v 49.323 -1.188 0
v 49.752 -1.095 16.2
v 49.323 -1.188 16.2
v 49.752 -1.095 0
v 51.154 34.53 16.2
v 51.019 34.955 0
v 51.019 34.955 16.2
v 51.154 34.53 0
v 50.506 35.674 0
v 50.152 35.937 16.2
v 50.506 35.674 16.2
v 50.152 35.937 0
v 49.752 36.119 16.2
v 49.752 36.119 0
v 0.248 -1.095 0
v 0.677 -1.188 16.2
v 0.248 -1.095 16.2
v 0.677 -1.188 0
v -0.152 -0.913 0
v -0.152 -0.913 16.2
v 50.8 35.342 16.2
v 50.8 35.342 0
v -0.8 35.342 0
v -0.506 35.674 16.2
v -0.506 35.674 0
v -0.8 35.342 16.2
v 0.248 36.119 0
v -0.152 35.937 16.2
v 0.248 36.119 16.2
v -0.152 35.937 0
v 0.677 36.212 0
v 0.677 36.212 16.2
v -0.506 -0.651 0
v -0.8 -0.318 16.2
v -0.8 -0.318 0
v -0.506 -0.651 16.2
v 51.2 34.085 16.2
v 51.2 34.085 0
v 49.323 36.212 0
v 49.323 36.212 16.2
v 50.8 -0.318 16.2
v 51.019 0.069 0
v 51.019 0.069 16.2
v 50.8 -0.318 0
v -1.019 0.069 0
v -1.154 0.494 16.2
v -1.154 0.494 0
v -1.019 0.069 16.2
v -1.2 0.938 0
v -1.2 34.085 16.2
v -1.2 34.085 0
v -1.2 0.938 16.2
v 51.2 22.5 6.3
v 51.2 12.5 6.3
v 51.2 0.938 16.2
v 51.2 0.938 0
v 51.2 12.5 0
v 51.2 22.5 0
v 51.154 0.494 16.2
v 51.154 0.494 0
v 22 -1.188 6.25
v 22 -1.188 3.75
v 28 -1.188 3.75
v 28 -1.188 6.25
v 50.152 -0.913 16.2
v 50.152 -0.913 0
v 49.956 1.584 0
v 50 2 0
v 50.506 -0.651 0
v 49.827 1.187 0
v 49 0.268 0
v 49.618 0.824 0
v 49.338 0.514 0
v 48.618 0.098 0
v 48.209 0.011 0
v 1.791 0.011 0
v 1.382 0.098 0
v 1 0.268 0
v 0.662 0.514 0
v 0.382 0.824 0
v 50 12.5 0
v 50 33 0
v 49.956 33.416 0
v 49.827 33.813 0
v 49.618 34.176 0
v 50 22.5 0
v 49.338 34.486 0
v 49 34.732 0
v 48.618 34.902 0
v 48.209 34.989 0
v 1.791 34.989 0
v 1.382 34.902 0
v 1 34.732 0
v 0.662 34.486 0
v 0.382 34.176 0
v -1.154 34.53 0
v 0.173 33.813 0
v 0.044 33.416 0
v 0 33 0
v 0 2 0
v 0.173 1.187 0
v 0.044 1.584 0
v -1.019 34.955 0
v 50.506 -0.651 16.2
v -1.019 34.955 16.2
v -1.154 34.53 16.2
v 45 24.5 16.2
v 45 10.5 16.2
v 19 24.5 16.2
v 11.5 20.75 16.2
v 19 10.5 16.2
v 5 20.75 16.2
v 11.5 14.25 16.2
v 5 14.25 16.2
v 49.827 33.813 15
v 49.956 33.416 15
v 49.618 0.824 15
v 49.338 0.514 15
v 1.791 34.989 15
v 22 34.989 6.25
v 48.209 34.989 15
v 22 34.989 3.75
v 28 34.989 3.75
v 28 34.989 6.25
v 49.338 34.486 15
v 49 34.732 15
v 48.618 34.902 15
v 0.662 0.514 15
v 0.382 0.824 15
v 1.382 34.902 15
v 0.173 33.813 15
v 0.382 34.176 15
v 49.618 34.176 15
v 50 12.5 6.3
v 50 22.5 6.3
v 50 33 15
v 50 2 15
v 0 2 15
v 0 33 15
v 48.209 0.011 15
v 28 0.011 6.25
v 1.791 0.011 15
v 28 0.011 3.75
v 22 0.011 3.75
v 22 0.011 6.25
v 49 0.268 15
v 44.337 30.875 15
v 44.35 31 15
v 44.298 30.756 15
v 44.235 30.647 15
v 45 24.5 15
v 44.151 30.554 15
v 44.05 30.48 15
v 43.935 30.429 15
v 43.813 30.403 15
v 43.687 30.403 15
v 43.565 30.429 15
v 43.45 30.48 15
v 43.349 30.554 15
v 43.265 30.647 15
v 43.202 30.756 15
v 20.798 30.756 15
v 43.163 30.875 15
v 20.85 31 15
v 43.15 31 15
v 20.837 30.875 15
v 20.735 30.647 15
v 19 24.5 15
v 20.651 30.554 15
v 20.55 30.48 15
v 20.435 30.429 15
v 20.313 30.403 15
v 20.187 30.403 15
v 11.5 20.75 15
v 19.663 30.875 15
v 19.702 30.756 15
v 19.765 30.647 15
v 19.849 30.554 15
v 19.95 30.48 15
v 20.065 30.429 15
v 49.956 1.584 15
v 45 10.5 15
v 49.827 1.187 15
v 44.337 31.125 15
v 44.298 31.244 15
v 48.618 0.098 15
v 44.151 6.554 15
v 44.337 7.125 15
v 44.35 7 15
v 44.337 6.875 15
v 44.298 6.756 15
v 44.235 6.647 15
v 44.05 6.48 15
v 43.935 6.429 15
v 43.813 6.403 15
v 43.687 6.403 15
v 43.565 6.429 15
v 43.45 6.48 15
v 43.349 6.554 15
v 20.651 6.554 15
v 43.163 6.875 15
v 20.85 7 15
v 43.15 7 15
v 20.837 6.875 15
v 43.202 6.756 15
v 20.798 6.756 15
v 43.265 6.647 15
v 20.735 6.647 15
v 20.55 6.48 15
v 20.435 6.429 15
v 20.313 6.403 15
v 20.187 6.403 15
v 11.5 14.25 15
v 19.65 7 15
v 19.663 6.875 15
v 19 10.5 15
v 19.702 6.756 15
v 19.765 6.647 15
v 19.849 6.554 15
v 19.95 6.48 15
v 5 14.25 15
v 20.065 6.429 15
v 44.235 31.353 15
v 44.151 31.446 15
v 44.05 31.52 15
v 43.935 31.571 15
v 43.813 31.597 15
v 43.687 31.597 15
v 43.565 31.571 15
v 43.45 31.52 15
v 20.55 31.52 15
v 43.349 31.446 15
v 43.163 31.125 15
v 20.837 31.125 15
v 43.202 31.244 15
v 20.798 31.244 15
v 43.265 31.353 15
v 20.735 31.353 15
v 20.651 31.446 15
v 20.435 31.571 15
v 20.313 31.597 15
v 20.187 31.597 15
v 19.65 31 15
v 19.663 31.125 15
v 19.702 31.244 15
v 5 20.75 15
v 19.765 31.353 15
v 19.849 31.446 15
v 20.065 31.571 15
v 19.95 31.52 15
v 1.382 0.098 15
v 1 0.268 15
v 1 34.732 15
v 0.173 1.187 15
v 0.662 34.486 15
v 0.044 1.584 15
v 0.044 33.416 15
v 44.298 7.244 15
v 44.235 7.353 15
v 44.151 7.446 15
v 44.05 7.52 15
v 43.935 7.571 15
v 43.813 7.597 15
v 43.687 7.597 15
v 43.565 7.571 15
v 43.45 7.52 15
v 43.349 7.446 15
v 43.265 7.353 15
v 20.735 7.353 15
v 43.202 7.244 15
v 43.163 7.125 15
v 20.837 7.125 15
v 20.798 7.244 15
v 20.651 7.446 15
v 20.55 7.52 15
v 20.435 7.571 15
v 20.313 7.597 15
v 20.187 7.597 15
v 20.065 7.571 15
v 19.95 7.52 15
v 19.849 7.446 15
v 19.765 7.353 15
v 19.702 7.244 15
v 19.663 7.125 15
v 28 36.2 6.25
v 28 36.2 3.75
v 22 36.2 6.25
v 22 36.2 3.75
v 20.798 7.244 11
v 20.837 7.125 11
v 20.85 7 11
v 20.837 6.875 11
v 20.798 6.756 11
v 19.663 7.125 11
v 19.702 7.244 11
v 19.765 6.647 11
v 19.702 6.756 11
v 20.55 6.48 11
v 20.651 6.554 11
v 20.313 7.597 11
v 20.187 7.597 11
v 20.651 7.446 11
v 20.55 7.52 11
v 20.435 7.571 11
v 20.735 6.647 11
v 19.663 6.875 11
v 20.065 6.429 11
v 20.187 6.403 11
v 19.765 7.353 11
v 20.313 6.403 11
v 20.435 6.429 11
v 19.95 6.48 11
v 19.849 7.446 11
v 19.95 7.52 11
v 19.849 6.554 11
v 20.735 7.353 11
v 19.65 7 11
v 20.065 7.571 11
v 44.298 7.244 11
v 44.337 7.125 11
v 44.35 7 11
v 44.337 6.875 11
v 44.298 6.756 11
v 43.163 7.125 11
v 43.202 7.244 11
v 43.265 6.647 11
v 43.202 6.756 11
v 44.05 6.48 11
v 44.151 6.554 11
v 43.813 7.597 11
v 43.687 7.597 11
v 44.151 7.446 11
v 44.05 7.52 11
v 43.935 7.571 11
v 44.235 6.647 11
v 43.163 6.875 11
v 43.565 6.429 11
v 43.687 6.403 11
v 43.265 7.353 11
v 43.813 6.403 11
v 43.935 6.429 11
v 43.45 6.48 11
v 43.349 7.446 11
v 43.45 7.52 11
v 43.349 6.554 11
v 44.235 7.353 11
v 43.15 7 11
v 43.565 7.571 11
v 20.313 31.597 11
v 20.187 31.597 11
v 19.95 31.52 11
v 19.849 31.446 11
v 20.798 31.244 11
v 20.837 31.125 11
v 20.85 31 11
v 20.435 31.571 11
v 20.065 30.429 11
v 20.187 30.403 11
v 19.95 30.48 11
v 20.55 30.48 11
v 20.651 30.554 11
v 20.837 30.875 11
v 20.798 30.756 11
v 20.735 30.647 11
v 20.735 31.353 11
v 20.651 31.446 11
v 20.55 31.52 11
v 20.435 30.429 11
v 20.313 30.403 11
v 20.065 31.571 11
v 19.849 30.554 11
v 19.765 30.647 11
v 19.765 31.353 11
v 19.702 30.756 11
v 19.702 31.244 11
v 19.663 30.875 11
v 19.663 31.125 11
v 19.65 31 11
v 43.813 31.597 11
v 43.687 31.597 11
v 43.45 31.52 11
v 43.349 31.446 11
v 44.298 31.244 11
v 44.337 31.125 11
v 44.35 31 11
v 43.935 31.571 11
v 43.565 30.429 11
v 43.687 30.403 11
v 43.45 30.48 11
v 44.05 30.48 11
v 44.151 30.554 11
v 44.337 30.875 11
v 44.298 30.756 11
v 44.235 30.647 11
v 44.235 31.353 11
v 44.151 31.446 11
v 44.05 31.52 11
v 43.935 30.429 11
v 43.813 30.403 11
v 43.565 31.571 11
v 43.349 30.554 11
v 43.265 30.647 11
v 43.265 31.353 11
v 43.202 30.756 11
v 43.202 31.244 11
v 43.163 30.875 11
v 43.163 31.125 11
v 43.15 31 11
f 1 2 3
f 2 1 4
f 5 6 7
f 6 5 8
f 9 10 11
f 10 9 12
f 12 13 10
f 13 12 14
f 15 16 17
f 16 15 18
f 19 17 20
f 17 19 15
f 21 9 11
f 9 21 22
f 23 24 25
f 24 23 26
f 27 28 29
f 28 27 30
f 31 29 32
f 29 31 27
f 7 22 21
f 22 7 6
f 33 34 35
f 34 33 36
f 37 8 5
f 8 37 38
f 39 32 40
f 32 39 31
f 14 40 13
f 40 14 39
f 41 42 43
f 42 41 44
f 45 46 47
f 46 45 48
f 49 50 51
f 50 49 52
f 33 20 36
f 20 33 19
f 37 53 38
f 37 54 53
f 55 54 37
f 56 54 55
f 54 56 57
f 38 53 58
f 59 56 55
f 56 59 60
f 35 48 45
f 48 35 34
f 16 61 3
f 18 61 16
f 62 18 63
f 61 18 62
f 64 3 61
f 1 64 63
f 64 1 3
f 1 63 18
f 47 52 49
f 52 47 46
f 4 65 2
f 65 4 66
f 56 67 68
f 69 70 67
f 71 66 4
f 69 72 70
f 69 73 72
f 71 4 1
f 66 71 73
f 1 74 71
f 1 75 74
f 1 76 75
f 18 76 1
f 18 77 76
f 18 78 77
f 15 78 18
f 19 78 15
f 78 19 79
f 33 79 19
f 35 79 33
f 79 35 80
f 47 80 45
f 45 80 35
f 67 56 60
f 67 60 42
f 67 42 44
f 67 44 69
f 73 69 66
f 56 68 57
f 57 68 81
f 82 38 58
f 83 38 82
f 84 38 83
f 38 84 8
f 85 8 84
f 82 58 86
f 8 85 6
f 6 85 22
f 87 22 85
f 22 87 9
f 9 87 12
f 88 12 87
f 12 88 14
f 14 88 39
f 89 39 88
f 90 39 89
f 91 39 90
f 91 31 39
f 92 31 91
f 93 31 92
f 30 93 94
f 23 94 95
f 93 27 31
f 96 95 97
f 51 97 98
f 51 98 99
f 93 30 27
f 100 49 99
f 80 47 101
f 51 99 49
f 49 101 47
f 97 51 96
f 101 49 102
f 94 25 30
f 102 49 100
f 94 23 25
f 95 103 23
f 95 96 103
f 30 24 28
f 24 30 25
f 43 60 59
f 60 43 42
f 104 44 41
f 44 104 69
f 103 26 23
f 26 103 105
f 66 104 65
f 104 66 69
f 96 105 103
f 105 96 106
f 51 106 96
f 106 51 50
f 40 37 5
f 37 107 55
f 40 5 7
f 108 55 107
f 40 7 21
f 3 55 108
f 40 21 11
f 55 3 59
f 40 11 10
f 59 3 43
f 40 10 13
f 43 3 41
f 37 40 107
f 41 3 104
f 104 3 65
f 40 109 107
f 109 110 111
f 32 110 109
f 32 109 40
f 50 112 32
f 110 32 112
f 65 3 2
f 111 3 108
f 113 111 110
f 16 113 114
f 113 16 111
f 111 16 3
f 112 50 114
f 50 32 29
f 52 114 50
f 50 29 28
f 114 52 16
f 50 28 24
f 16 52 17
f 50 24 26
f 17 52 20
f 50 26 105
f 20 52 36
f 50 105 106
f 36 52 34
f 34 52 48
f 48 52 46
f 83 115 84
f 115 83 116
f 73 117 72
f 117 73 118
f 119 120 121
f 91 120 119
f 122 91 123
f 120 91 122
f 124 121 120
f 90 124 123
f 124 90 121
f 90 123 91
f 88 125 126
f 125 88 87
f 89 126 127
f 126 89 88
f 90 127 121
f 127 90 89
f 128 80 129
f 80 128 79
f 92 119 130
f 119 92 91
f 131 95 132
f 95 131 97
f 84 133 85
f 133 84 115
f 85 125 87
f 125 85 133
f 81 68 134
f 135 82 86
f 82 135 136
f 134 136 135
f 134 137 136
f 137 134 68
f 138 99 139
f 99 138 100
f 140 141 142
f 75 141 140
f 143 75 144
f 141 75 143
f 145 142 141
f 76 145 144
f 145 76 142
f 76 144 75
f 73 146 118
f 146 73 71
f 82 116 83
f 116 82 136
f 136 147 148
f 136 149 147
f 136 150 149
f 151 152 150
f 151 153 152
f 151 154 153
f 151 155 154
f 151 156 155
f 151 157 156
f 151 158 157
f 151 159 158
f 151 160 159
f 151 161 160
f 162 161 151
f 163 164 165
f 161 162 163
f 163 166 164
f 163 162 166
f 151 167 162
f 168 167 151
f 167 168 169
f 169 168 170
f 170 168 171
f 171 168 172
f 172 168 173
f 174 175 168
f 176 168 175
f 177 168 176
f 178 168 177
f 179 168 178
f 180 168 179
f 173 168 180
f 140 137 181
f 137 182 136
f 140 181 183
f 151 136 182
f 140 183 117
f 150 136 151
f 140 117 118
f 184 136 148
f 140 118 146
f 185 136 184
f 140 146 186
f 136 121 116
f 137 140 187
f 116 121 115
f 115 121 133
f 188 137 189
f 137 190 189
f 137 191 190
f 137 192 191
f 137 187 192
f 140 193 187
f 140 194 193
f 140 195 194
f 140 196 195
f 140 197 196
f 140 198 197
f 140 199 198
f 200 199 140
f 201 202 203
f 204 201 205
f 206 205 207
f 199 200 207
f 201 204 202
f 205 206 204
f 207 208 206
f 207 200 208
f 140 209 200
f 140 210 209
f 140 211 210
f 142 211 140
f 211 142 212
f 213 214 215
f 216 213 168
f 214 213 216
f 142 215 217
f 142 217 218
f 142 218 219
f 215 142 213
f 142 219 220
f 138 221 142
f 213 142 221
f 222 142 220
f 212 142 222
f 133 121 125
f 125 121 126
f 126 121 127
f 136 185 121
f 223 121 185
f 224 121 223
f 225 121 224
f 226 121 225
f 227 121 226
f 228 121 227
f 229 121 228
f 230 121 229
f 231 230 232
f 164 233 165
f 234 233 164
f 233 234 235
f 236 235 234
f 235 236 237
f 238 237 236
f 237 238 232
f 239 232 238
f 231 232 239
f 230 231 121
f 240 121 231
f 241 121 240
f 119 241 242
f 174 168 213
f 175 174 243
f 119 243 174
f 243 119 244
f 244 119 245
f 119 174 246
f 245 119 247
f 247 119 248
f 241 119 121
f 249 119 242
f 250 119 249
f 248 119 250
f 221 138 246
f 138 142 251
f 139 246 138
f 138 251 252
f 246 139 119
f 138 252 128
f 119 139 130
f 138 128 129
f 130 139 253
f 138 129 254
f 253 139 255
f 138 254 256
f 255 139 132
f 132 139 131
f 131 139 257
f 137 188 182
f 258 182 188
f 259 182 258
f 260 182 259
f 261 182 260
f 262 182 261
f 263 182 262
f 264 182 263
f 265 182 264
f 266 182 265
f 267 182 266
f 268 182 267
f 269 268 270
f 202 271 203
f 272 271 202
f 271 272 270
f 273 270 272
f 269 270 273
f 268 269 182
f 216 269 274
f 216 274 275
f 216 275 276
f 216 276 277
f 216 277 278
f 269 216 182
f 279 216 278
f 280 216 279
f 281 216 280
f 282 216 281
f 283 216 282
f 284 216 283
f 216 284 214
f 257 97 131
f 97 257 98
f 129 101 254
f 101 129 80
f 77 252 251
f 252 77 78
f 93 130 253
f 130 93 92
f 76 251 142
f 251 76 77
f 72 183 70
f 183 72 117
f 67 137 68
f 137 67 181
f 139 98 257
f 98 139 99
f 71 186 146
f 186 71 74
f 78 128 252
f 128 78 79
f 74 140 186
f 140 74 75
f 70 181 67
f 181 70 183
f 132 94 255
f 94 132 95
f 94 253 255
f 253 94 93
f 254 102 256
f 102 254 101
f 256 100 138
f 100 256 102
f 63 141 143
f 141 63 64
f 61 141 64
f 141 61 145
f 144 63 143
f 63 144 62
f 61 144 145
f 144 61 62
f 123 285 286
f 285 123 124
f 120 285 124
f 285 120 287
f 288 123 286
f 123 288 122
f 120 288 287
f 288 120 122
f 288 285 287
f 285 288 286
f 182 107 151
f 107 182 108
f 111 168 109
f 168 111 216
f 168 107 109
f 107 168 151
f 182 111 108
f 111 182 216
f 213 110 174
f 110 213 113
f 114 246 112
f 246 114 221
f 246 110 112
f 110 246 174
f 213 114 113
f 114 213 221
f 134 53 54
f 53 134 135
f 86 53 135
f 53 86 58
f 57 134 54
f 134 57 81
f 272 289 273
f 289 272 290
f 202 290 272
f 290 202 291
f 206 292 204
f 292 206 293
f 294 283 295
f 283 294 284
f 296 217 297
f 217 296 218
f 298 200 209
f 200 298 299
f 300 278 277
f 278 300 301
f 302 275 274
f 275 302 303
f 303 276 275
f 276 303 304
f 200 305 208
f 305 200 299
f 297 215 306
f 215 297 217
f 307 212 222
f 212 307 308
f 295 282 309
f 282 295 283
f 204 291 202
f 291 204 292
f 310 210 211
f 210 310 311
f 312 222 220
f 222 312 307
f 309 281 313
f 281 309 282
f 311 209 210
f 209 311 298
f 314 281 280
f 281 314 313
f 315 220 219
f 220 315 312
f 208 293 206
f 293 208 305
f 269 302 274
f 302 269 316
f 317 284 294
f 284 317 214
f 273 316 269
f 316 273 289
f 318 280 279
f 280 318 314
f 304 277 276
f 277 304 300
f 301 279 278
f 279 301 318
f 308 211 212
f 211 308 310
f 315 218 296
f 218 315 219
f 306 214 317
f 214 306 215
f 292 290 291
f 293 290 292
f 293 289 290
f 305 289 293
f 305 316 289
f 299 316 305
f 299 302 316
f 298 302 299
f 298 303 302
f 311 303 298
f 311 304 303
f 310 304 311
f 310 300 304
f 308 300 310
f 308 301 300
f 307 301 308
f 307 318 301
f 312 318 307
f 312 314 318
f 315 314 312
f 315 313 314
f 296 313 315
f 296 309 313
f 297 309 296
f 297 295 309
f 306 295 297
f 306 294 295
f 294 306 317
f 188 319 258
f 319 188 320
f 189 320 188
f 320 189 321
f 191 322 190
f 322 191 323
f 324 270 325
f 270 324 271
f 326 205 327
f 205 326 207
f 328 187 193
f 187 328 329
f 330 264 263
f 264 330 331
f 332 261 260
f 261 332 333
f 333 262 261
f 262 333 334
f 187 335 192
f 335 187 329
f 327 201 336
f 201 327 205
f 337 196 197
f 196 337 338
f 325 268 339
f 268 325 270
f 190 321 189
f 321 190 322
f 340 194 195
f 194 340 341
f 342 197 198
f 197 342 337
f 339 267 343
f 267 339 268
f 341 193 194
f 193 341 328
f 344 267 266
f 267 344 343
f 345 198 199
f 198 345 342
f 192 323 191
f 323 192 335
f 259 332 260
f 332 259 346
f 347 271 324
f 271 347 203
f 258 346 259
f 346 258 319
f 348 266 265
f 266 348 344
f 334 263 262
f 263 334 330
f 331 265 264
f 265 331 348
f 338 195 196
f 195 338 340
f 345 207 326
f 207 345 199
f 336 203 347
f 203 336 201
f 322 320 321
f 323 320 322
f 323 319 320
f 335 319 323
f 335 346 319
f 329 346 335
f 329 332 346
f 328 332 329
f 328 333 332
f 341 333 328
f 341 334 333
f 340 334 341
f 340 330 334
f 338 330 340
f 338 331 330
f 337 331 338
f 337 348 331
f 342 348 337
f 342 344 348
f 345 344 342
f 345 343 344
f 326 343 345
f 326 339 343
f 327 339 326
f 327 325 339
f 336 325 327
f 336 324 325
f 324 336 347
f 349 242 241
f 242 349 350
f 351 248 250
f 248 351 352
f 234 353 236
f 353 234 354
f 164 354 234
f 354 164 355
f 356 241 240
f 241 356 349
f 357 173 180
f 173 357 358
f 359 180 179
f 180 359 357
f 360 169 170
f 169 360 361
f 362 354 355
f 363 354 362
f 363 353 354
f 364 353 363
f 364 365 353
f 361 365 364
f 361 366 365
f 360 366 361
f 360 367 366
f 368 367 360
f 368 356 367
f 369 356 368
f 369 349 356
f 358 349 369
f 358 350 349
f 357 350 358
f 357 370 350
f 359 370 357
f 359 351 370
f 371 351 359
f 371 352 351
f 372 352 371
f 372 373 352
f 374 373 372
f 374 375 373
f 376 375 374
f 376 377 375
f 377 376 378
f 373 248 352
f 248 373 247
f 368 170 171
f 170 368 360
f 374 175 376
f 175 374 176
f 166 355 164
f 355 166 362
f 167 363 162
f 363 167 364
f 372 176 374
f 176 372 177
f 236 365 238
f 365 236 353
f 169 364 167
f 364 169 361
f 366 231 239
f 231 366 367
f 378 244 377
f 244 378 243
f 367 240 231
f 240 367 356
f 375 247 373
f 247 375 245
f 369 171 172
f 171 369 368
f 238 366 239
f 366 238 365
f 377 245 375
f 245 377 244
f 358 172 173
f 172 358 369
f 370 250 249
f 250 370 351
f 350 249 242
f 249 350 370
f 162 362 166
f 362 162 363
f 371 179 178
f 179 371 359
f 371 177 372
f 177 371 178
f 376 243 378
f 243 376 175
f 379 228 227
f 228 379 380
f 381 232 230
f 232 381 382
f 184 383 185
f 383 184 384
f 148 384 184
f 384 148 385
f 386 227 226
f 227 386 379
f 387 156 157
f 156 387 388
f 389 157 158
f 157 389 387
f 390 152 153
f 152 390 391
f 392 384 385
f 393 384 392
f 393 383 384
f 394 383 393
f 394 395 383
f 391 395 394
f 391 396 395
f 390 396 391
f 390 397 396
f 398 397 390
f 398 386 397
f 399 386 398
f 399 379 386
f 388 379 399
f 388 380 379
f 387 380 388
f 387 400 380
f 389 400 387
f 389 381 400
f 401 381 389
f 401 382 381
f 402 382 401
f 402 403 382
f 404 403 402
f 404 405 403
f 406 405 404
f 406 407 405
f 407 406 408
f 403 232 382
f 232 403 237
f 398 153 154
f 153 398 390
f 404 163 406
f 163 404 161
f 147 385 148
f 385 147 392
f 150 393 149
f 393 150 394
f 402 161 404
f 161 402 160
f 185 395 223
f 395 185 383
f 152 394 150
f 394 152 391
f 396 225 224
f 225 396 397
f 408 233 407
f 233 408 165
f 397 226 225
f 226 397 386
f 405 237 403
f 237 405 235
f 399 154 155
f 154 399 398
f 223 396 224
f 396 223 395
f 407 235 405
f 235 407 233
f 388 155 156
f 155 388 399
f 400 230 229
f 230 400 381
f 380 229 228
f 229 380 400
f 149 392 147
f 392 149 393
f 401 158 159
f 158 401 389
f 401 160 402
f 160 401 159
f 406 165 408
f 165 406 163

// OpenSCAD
shell_t = 1.2;
inner_w = 50;
inner_h = 35;
inner_l = 15;
corner_r = 2;

lcd_opening_w = 26;
lcd_opening_h = 14;
lcd_up_offset = 6.5;
lcd_opening_x_margin = 5;

lcd_pegs_span_x = 23.5;
lcd_pegs_span_y = 24;
lcd_pegs_d = 1.2;
lcd_pegs_h = 4 + shell_t;
lcd_pegs_y_shift = 1.5;

button_d = 6.5;
button_x_margin = 5;

snap_slit_width = 6;
snap_slit_height = 2.5;
snap_slit_z = 5;

usb_slit_w = 10;
usb_slit_h = 8;
usb_slit_depth = 8;

cage_inner_wx = 35;
cage_inner_wy = 26.5;
cage_h = 7.5;
cage_t = 1.2;
cage_claw_wy = 10;
cage_claw_wx = 15;
cage_claw_t = 2;

tolerance = 0.5;

$fs = 0.01;

module box(width, height, length) {
     translate([inner_w / 2, inner_h / 2, 0]) linear_extrude(length) minkowski() {
         circle(r=corner_r);
         square([width - 2*corner_r, height - 2*corner_r], center = true);
     }
}

module box_shell() {
    difference() {
        translate([-shell_t, -shell_t, 0])
        resize([inner_w + 2*shell_t, inner_h + 2*shell_t, 0]) 
            box(inner_w, inner_h, inner_l + shell_t);
        translate([0, 0, -shell_t]) box(inner_w, inner_h, inner_l + shell_t);
    }
}

module lcd_pegs() {
    translate([-lcd_pegs_span_x / 2, -lcd_pegs_span_y / 2])
        cylinder(d=lcd_pegs_d, h=lcd_pegs_h);
    translate([lcd_pegs_span_x / 2, -lcd_pegs_span_y / 2])
        cylinder(d=lcd_pegs_d, h=lcd_pegs_h);
    translate([-lcd_pegs_span_x / 2, lcd_pegs_span_y / 2])
        cylinder(d=lcd_pegs_d, h=lcd_pegs_h);
    translate([lcd_pegs_span_x / 2, lcd_pegs_span_y / 2])
        cylinder(d=lcd_pegs_d, h=lcd_pegs_h);
}

module side_slits() {
    translate([inner_w / 2, 0, snap_slit_z])
        cube([snap_slit_width, 2*shell_t, snap_slit_height], center=true);
    translate([inner_w / 2, inner_h, snap_slit_z])
        cube([snap_slit_width, 2*shell_t, snap_slit_height], center=true);
}

module usb_slit() {
    translate([inner_w - usb_slit_depth / 2 + shell_t, inner_h/2, usb_slit_h / 2 - shell_t - 1])
        cube([usb_slit_depth + 1, usb_slit_w, usb_slit_h + 1], center = true);
}

module box_main() {
    difference() {
        box_shell();
        
        // Screen opening
        translate([inner_w - lcd_opening_w/2 - lcd_opening_x_margin,
            inner_h / 2, inner_l + 0.5*shell_t])
        cube([lcd_opening_w, lcd_opening_h, 2*shell_t], center=true);
        
        // Button opening
        translate([button_x_margin, (inner_h - button_d) / 2, inner_l - 0.5*shell_t])
            cube([button_d, button_d, 2*shell_t]);
        
        side_slits();        
        usb_slit();
    }
    
    translate([inner_w - lcd_opening_w/2 - lcd_opening_x_margin,
        inner_h / 2 + lcd_pegs_y_shift,
        inner_l - lcd_pegs_h + shell_t]) lcd_pegs();
}

module snap_tab() {
    tab_width = snap_slit_width - tolerance;
    snap_tab_r = 0.7 * snap_slit_height / 2;
    translate([(inner_w - tab_width) / 2, 0, 0]) {
        cube([tab_width, shell_t, snap_slit_z + snap_tab_r]);
        translate([0, 0, snap_slit_z])
            rotate([0, 90, 0]) cylinder(h=tab_width, r=snap_tab_r);
    }    
}

module board_cage() {
    translate([cage_claw_t, 0, 0]) {
        cube([cage_inner_wx, cage_t, cage_h]);
        translate([0, cage_inner_wy + cage_t, 0]) cube([cage_inner_wx, cage_t, cage_h]);
    }
    cube([cage_claw_t, cage_inner_wy + 2*cage_t, cage_h]);
    translate([0, cage_t + (cage_inner_wy - cage_claw_wy) / 2, cage_h - cage_claw_t])
        cube([cage_claw_wx, cage_claw_wy, cage_claw_t]);
    translate([cage_claw_wx - 1.6, cage_t + (cage_inner_wy - cage_claw_wy) / 2, 0])
        cube([0.8, cage_claw_wy, cage_h - cage_claw_t]);
}

module bottom_lid() {
    difference() {
        union() {
            translate([-shell_t, -shell_t, -shell_t])
                resize([inner_w + 2*shell_t, inner_h + 2*shell_t, 0]) 
                box(inner_w, inner_h, shell_t);
            snap_tab();
            translate([0, inner_h, 0]) mirror([0, 1, 0]) snap_tab();
            
            translate([inner_w - (cage_inner_wx + cage_claw_t),
                (inner_h - (cage_inner_wy + 2*cage_t)) / 2, 0]) board_cage();
        }
        usb_slit();
    }
}

box_main();
//bottom_lid();
